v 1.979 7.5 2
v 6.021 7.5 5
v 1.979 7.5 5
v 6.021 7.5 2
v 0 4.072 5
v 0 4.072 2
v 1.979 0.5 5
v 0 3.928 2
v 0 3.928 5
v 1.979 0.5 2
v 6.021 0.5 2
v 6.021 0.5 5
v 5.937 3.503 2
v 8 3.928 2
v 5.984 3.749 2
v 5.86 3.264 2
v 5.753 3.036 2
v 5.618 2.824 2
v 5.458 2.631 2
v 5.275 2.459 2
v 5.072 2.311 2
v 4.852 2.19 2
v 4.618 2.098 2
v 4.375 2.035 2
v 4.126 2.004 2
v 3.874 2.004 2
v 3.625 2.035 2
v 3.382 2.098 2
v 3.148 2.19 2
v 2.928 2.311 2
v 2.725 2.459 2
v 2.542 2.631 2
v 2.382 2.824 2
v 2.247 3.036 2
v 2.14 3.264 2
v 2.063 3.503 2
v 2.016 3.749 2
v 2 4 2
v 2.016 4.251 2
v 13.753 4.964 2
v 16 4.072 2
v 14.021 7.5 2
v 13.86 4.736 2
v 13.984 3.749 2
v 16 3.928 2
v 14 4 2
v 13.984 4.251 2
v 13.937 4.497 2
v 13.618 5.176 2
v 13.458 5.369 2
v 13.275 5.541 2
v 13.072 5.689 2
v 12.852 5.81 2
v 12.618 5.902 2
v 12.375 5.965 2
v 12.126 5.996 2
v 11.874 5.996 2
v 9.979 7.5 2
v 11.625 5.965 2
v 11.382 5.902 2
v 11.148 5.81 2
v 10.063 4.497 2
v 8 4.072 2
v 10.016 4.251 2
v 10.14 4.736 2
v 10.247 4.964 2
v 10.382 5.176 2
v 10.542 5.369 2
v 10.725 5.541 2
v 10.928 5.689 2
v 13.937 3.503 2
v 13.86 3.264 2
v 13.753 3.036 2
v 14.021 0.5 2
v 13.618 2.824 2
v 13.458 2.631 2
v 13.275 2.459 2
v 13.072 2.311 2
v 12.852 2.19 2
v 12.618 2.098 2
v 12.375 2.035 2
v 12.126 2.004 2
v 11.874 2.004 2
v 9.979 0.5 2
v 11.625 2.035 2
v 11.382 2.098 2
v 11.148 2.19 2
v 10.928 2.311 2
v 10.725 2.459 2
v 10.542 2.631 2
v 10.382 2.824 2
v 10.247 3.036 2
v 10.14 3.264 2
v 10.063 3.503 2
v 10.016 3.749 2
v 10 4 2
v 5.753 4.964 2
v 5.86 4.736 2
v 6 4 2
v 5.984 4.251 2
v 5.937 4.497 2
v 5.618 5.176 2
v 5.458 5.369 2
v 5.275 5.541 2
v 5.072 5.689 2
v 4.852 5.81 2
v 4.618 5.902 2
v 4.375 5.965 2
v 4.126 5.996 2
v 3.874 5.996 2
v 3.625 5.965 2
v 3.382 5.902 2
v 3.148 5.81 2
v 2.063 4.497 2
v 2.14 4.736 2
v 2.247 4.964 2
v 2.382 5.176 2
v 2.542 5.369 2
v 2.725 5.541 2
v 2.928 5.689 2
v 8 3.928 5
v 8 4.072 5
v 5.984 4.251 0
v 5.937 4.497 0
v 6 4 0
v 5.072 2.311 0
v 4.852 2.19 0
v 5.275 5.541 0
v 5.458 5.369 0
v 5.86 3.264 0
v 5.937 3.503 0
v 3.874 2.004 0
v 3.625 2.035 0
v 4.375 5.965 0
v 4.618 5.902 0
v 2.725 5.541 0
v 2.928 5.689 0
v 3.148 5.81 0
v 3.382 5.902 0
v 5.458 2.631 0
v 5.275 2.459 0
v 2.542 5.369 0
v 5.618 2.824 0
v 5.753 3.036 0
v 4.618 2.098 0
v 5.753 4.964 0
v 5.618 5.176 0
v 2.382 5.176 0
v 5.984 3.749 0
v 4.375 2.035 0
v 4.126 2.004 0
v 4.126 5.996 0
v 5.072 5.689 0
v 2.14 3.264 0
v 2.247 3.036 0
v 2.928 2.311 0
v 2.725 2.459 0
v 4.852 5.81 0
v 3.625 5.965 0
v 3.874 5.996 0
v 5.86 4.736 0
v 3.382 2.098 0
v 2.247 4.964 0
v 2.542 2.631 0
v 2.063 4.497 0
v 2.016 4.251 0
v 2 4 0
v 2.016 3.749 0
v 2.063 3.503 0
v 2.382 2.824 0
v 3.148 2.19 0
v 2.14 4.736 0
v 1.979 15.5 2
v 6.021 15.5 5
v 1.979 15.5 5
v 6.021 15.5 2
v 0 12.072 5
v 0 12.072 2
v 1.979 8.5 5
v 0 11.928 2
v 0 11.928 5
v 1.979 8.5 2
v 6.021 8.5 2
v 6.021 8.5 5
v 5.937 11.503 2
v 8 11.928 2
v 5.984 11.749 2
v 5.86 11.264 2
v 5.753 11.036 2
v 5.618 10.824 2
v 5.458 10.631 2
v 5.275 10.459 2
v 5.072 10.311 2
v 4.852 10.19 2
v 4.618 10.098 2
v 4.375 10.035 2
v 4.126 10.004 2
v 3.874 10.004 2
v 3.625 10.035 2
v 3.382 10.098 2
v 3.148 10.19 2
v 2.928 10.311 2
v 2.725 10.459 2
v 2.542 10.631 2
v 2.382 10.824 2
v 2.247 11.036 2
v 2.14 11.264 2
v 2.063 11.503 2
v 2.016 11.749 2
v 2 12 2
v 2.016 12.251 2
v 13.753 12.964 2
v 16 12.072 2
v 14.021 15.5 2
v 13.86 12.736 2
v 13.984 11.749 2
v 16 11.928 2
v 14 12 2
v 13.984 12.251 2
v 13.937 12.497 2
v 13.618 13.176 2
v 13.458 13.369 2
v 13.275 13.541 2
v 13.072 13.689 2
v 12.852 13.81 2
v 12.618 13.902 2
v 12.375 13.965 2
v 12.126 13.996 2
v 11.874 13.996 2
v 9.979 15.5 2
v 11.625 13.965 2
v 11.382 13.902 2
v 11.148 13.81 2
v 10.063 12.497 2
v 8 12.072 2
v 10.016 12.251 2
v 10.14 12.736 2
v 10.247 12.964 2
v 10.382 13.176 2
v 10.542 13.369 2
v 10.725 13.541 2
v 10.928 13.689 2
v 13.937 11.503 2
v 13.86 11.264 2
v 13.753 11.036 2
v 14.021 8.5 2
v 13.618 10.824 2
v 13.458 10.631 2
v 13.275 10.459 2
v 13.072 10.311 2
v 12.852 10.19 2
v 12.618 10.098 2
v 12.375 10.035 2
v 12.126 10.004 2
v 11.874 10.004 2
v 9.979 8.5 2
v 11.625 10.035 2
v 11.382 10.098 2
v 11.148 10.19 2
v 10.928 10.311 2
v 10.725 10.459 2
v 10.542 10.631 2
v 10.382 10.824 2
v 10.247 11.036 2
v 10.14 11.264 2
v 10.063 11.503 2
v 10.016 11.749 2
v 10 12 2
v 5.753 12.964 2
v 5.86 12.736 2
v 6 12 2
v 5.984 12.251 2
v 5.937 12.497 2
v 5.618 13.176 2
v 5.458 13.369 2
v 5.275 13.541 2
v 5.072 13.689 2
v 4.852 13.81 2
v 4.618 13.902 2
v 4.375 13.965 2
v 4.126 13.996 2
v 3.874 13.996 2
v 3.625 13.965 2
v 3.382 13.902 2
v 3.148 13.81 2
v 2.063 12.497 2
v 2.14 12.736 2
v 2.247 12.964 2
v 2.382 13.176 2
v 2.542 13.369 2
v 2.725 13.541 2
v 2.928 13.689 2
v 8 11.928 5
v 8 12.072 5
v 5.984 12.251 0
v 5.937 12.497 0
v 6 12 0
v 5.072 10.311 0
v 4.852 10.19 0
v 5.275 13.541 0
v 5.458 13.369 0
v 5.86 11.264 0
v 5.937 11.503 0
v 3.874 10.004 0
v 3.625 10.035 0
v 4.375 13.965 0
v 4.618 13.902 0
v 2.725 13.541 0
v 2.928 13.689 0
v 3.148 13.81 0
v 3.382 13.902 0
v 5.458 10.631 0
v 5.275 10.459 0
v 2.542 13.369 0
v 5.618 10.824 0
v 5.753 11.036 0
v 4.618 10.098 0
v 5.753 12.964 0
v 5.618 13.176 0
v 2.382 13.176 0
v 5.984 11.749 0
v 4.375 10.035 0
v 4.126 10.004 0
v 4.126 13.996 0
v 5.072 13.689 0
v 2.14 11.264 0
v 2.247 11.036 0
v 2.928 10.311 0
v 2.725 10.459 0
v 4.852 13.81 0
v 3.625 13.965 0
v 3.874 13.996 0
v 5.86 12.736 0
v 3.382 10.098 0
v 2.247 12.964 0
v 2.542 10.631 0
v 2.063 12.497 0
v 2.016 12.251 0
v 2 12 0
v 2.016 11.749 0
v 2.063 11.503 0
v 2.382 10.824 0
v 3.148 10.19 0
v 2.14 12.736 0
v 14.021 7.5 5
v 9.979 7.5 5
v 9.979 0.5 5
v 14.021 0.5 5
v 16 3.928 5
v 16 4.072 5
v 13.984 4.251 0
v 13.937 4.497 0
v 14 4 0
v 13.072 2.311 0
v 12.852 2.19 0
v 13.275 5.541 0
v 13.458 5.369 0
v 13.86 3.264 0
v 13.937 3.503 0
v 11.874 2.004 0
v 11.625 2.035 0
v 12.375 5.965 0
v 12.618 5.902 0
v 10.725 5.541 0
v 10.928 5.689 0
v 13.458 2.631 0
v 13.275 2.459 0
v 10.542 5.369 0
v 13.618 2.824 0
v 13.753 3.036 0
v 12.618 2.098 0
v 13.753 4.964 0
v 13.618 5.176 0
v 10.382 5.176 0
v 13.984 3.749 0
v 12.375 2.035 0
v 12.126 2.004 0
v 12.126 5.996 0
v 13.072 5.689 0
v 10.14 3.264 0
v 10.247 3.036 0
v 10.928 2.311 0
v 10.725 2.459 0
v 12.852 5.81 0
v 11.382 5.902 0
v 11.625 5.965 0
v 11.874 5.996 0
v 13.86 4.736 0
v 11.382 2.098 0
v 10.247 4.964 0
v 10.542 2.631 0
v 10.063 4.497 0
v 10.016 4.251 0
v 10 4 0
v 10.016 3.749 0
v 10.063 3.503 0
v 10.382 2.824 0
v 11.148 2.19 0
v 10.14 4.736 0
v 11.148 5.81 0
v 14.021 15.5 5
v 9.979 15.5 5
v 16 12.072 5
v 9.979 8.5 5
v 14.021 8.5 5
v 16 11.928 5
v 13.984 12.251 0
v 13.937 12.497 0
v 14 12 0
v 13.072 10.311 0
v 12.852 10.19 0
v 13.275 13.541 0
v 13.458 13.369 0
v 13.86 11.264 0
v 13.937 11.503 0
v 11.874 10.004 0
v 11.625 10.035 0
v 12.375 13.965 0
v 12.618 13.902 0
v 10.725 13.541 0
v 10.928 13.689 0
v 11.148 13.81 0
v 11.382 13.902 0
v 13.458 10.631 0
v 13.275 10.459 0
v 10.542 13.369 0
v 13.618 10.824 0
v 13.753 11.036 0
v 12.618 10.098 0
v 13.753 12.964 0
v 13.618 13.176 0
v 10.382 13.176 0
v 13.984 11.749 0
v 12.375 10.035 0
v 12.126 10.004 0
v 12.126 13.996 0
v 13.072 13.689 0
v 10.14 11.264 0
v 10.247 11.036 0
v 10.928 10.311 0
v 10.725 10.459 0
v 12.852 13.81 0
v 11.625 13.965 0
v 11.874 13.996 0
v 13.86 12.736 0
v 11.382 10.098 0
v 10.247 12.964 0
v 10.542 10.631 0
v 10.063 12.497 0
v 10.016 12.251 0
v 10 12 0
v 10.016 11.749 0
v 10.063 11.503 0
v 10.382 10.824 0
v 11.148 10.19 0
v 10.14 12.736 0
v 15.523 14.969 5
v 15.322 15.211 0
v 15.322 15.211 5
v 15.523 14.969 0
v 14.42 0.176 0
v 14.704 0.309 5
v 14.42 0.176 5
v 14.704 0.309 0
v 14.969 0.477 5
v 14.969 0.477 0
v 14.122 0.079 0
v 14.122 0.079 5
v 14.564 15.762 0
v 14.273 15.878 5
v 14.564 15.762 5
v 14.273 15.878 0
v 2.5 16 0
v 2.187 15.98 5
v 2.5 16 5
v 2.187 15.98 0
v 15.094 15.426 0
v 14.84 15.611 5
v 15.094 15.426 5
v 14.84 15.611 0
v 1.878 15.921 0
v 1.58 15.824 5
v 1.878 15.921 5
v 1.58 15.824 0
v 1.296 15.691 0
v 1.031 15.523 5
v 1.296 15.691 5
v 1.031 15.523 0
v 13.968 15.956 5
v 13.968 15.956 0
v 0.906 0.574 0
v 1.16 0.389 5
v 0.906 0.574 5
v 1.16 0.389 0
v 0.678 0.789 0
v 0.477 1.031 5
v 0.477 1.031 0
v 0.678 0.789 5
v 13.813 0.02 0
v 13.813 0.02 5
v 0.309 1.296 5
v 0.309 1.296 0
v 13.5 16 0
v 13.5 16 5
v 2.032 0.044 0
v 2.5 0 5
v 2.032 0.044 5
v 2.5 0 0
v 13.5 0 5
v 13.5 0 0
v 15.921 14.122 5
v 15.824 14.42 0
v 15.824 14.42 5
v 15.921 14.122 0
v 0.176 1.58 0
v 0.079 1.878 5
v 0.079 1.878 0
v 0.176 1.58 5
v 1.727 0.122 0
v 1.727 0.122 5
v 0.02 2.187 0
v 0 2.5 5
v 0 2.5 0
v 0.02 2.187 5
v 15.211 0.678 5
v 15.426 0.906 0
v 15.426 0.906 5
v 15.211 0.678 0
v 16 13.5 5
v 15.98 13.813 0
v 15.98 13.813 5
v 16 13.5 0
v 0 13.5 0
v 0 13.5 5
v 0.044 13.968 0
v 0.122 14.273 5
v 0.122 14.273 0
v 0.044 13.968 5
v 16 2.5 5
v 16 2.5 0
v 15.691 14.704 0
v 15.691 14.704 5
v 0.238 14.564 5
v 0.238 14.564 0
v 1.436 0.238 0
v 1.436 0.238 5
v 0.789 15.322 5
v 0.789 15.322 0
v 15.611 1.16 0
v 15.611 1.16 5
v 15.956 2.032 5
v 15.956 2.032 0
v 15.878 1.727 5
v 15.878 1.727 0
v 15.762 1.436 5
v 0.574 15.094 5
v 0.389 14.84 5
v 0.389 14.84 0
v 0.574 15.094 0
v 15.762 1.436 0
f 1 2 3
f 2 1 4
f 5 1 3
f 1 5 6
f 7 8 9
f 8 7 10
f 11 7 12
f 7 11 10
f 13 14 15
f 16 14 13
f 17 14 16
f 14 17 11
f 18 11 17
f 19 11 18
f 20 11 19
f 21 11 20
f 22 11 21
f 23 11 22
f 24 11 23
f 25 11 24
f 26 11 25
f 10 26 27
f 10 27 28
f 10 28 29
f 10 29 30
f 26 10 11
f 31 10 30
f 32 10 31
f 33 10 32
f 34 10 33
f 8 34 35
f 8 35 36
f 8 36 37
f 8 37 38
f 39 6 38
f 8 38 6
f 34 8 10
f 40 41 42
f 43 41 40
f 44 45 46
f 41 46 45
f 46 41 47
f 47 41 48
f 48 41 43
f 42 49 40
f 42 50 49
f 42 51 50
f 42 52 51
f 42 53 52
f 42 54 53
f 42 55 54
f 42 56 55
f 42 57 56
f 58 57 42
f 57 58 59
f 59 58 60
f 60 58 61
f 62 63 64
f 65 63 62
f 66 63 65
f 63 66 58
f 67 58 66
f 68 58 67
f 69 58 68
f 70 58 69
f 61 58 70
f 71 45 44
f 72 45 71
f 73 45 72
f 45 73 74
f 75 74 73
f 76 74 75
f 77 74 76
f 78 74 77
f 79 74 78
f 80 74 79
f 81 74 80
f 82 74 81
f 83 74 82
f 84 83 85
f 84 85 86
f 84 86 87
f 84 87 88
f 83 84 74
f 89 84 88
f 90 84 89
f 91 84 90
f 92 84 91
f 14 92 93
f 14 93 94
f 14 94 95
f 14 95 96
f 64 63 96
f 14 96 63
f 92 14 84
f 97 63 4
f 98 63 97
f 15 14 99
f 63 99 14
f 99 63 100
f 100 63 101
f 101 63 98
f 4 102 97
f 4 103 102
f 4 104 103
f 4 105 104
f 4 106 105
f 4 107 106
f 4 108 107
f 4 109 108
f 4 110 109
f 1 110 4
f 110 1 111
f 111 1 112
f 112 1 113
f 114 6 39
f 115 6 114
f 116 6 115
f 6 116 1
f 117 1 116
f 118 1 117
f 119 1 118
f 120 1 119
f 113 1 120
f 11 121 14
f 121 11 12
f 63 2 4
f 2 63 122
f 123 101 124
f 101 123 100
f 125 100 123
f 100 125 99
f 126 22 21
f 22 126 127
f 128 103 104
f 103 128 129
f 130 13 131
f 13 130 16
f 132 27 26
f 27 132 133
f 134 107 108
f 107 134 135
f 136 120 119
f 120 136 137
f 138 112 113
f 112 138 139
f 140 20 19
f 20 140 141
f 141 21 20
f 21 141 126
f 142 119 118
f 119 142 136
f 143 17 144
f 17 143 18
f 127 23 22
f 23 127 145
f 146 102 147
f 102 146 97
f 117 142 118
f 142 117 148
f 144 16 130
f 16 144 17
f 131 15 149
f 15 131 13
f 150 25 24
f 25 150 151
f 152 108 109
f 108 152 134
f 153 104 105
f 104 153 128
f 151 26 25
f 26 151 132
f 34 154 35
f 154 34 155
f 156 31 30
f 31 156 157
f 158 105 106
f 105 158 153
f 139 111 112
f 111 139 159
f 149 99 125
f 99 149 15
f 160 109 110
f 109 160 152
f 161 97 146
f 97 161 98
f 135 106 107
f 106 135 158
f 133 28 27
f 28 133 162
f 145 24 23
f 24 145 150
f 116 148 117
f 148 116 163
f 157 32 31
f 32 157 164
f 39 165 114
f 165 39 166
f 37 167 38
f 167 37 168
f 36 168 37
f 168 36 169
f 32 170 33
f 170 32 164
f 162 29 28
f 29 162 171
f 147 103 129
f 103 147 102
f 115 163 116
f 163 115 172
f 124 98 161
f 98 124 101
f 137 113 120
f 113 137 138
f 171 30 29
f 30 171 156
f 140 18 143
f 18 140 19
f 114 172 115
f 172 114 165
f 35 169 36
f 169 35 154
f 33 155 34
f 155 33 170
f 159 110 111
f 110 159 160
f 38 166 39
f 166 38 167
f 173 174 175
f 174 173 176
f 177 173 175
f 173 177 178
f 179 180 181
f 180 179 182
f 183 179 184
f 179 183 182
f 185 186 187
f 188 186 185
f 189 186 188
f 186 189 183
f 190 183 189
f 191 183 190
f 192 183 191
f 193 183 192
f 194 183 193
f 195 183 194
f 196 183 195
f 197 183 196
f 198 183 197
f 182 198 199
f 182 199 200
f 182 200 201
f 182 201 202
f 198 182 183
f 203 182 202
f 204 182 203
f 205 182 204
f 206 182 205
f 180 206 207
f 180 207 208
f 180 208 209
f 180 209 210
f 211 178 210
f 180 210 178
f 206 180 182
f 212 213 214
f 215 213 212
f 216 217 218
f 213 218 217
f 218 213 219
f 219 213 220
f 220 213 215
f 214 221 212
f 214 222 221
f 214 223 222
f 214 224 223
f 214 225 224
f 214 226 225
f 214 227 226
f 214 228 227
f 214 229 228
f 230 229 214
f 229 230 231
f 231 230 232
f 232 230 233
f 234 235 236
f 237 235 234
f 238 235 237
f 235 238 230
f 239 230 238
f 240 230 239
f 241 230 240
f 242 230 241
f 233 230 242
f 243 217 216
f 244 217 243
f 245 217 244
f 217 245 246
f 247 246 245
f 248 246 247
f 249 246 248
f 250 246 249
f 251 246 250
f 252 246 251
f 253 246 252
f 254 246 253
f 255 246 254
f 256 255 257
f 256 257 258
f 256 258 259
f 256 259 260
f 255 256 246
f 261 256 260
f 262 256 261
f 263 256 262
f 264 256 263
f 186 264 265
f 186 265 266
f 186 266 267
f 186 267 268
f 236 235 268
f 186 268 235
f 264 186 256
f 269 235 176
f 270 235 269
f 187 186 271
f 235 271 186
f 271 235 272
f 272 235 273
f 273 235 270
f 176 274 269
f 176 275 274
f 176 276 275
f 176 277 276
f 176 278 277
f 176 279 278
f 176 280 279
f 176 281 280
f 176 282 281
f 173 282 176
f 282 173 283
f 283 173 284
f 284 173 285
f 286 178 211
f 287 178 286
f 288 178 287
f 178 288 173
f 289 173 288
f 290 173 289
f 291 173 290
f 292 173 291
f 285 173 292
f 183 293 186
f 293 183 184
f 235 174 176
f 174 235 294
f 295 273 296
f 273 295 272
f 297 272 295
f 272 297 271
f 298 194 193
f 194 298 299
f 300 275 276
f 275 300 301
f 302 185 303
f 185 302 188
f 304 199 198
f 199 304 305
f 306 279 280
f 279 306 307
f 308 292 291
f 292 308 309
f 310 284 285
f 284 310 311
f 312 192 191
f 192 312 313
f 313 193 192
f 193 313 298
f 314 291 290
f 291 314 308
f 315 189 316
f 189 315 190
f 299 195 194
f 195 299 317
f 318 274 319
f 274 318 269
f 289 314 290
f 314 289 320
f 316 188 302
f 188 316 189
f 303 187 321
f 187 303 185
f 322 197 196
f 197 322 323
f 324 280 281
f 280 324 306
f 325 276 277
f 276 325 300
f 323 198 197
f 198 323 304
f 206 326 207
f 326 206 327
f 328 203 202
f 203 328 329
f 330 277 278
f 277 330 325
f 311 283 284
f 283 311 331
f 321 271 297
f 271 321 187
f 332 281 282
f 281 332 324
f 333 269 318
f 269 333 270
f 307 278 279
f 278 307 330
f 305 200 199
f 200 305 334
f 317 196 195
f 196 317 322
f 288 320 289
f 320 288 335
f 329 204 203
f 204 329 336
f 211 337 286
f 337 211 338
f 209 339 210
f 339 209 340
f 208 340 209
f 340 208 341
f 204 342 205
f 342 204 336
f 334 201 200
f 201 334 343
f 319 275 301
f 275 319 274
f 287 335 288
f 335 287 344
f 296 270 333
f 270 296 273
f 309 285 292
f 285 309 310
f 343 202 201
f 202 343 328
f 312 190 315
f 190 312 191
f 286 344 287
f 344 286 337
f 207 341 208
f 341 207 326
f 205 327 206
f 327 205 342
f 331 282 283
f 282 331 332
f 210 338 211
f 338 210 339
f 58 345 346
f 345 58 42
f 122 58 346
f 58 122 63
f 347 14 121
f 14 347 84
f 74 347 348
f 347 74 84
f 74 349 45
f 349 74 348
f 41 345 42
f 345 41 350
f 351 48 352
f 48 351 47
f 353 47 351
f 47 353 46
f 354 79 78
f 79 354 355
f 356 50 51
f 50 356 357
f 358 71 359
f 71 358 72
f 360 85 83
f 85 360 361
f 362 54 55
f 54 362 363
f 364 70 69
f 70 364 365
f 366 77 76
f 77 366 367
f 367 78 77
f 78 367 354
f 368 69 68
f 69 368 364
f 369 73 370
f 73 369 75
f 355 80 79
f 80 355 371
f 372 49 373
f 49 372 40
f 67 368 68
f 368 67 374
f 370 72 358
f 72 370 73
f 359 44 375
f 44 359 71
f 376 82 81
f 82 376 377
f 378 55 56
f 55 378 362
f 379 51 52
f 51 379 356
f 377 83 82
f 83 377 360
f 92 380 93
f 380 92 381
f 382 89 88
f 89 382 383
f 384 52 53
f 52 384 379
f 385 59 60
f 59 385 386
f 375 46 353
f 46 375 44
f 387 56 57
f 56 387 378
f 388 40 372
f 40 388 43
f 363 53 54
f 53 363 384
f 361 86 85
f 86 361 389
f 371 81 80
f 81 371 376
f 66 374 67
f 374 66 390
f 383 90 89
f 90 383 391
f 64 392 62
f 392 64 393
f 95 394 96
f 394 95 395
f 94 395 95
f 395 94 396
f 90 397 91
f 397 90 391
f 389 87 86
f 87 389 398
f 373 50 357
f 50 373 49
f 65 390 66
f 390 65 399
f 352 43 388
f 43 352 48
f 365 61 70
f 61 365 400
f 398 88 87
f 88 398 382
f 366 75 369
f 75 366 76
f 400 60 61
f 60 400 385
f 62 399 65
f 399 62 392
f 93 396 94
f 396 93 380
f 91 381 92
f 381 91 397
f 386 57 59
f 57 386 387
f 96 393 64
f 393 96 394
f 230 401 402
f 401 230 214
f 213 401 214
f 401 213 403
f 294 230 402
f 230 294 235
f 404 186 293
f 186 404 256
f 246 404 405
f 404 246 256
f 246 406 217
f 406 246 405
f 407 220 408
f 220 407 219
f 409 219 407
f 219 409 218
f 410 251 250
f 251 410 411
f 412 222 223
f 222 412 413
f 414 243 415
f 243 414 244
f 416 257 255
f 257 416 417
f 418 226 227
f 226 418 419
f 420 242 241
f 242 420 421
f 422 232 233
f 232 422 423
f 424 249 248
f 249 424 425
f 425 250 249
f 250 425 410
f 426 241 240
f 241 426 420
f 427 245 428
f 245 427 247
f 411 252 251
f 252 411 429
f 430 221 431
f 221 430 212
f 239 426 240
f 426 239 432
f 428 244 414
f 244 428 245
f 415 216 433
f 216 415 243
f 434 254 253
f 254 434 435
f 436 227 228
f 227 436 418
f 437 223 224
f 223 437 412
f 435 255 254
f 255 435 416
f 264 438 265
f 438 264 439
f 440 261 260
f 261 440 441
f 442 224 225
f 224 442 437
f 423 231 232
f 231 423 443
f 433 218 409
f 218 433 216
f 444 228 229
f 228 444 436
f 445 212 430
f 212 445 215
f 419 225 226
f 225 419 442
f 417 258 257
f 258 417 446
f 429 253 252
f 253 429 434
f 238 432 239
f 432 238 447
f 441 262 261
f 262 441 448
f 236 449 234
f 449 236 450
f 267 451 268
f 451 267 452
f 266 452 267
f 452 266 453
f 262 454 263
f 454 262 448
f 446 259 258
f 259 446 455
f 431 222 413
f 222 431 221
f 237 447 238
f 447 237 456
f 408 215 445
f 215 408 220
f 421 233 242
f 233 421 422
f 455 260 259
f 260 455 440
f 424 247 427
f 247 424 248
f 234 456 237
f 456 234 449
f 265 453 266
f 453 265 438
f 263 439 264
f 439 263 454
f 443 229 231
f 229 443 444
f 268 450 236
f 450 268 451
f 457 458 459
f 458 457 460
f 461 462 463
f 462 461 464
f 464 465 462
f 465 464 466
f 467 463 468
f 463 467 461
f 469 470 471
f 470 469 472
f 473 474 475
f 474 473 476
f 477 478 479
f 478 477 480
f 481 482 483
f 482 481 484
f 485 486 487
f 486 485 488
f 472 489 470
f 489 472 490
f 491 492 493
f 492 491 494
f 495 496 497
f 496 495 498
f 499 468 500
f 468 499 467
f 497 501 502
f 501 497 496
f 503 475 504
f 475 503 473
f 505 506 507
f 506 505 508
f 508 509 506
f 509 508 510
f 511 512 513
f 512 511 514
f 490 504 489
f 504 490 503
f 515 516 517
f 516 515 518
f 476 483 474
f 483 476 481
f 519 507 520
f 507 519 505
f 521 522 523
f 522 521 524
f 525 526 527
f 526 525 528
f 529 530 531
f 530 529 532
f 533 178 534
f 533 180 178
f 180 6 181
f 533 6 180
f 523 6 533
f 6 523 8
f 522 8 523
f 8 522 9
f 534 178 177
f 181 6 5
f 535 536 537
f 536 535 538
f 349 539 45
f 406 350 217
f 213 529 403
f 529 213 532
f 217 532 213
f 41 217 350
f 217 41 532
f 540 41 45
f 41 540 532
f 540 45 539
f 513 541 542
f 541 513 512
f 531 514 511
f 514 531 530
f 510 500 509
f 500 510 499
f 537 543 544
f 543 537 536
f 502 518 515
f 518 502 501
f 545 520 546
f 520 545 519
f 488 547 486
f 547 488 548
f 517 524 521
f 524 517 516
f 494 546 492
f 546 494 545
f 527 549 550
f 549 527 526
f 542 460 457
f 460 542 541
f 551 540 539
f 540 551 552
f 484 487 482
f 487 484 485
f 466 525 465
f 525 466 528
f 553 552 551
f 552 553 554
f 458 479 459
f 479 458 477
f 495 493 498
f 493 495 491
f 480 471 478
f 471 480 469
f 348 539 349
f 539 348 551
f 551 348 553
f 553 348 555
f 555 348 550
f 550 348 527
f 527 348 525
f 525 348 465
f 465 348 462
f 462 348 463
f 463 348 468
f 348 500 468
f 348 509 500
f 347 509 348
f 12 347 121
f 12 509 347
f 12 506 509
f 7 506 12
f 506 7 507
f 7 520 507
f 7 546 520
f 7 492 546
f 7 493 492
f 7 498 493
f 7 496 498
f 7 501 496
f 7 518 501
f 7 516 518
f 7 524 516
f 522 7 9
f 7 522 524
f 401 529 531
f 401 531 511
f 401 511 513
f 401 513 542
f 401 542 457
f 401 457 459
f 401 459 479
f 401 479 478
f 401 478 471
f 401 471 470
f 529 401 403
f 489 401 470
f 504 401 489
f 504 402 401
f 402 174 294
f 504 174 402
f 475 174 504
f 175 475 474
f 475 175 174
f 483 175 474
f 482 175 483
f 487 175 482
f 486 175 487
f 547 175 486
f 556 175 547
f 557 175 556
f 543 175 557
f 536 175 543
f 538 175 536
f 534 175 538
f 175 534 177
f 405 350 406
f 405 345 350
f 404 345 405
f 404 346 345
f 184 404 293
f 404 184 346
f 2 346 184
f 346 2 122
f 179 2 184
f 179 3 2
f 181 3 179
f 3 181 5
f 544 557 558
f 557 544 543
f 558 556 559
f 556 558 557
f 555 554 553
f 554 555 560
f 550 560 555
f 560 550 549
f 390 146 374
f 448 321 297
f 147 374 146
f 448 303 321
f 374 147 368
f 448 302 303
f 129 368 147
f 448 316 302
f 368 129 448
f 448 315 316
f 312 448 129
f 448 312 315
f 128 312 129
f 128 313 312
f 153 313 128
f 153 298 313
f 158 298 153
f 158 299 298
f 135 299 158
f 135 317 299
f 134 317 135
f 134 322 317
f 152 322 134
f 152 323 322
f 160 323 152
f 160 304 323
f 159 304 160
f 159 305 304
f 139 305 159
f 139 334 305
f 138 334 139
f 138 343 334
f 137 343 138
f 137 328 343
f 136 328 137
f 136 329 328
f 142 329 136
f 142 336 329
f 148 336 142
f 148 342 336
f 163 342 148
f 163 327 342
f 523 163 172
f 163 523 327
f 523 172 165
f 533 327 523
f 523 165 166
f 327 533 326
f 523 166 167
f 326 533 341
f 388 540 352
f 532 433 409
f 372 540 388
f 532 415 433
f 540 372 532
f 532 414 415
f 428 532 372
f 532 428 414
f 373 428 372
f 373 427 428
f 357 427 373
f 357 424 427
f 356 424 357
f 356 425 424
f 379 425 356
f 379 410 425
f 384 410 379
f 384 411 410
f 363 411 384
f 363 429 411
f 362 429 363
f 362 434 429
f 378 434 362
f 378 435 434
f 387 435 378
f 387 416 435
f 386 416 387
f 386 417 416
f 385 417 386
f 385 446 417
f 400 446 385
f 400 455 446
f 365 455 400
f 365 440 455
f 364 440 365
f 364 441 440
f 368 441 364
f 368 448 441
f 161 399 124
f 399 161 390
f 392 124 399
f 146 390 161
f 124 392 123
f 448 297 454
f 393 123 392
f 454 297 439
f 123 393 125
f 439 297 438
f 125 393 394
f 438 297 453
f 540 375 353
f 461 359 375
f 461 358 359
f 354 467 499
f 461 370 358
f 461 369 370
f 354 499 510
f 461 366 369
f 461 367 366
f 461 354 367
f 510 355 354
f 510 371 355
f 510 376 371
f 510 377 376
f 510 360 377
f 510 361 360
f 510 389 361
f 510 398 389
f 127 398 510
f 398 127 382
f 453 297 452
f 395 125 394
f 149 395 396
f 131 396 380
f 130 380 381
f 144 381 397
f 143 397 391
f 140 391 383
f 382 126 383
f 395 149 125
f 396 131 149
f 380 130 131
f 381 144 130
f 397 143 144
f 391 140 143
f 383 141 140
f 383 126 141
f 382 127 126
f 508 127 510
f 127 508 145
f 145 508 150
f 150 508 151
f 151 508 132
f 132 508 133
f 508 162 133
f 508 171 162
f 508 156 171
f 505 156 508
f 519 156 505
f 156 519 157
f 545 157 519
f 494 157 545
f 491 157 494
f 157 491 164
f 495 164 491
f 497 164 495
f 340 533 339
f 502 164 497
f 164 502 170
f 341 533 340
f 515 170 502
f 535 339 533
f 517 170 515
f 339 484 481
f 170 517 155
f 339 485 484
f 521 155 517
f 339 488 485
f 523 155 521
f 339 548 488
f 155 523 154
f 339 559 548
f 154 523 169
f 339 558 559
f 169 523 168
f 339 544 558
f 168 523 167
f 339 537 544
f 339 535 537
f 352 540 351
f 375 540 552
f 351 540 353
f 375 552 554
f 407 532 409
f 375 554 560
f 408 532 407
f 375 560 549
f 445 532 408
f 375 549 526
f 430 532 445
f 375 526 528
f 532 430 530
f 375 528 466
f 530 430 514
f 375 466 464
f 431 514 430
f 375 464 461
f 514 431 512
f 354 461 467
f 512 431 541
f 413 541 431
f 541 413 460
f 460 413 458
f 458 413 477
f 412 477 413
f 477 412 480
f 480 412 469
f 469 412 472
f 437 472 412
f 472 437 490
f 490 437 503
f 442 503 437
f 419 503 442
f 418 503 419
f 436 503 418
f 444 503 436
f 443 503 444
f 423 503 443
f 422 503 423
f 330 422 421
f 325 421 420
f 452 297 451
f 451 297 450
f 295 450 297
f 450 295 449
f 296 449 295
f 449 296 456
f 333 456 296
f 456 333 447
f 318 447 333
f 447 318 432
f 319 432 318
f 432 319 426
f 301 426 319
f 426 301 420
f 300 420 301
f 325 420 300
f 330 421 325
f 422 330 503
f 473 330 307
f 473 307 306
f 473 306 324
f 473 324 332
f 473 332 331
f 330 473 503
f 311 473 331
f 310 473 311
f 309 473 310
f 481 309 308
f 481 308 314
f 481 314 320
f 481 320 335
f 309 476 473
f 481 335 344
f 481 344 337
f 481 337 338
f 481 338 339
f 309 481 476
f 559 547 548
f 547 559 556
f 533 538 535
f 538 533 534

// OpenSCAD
$fn=50;

// hexagon - A 2D hexagon with flat to flat diameter w. Flats are parallel to x axis.
module hexagon(w)
{
    s = w/sqrt(3);
    polygon([[-s/2,w/2],[s/2,w/2],[s,0],[s/2,-w/2],[-s/2,-w/2],[-s,0]]);
}

// hexagonalPrism - An extrusion of the hexagon. Has an optional drop below the xy plane.
module hexagonalPrism(w, h)
{
    linear_extrude(h)
    hexagon(w);
}

module roundRect(x, y, z, r)
{
    linear_extrude(z,convexity=1)
    translate([r,r])
    offset(r)
    square([x-2*r,y-2*r]);
}

module NutHolder(xsize,ysize,xlist,ylist,xtrim=0,ytrim=0,rotation=0)
{
    difference()
    {
        translate([xtrim,ytrim])
        roundRect(xsize-2*xtrim,ysize-2*ytrim,2.5,2.5);
        for (x=xlist) for (y=ylist)
            translate([x,y,-0.1])
            rotate([0,0,rotation])
            hexagonalPrism(7,3);
    }
    
    
    
}

module ThreadedPlate(xsize,ysize,xlist,ylist,xtrim=0,ytrim=0)
{
    difference()
    {
        translate([xtrim,ytrim])
        roundRect(xsize-2*xtrim,ysize-2*ytrim,5,2.5);
        for (x=xlist) for (y=ylist)
        {
            translate([x,y,2])
            hexagonalPrism(7,4);
            translate([x,y,-0.1])
            cylinder(r=2,h=4);
        }
    }
    
    
    
}

module LargeFourHoleThreadedPlate()
{
    difference()
    {
        ThreadedPlate(48,48,[8,40],[8,40],3,3);
        translate([24,24,-0.1])
        cylinder(r=16,h=6);
    }
}

module SimpleThreadedPlate(n,m)
{
    ThreadedPlate(8*n,8*m,[for (i=[0:n]) 8*i+4],[for (i=[0:m]) 8*i+4],0,0);
}

SimpleThreadedPlate(2,2);

//LargeFourHoleThreadedPlate();
